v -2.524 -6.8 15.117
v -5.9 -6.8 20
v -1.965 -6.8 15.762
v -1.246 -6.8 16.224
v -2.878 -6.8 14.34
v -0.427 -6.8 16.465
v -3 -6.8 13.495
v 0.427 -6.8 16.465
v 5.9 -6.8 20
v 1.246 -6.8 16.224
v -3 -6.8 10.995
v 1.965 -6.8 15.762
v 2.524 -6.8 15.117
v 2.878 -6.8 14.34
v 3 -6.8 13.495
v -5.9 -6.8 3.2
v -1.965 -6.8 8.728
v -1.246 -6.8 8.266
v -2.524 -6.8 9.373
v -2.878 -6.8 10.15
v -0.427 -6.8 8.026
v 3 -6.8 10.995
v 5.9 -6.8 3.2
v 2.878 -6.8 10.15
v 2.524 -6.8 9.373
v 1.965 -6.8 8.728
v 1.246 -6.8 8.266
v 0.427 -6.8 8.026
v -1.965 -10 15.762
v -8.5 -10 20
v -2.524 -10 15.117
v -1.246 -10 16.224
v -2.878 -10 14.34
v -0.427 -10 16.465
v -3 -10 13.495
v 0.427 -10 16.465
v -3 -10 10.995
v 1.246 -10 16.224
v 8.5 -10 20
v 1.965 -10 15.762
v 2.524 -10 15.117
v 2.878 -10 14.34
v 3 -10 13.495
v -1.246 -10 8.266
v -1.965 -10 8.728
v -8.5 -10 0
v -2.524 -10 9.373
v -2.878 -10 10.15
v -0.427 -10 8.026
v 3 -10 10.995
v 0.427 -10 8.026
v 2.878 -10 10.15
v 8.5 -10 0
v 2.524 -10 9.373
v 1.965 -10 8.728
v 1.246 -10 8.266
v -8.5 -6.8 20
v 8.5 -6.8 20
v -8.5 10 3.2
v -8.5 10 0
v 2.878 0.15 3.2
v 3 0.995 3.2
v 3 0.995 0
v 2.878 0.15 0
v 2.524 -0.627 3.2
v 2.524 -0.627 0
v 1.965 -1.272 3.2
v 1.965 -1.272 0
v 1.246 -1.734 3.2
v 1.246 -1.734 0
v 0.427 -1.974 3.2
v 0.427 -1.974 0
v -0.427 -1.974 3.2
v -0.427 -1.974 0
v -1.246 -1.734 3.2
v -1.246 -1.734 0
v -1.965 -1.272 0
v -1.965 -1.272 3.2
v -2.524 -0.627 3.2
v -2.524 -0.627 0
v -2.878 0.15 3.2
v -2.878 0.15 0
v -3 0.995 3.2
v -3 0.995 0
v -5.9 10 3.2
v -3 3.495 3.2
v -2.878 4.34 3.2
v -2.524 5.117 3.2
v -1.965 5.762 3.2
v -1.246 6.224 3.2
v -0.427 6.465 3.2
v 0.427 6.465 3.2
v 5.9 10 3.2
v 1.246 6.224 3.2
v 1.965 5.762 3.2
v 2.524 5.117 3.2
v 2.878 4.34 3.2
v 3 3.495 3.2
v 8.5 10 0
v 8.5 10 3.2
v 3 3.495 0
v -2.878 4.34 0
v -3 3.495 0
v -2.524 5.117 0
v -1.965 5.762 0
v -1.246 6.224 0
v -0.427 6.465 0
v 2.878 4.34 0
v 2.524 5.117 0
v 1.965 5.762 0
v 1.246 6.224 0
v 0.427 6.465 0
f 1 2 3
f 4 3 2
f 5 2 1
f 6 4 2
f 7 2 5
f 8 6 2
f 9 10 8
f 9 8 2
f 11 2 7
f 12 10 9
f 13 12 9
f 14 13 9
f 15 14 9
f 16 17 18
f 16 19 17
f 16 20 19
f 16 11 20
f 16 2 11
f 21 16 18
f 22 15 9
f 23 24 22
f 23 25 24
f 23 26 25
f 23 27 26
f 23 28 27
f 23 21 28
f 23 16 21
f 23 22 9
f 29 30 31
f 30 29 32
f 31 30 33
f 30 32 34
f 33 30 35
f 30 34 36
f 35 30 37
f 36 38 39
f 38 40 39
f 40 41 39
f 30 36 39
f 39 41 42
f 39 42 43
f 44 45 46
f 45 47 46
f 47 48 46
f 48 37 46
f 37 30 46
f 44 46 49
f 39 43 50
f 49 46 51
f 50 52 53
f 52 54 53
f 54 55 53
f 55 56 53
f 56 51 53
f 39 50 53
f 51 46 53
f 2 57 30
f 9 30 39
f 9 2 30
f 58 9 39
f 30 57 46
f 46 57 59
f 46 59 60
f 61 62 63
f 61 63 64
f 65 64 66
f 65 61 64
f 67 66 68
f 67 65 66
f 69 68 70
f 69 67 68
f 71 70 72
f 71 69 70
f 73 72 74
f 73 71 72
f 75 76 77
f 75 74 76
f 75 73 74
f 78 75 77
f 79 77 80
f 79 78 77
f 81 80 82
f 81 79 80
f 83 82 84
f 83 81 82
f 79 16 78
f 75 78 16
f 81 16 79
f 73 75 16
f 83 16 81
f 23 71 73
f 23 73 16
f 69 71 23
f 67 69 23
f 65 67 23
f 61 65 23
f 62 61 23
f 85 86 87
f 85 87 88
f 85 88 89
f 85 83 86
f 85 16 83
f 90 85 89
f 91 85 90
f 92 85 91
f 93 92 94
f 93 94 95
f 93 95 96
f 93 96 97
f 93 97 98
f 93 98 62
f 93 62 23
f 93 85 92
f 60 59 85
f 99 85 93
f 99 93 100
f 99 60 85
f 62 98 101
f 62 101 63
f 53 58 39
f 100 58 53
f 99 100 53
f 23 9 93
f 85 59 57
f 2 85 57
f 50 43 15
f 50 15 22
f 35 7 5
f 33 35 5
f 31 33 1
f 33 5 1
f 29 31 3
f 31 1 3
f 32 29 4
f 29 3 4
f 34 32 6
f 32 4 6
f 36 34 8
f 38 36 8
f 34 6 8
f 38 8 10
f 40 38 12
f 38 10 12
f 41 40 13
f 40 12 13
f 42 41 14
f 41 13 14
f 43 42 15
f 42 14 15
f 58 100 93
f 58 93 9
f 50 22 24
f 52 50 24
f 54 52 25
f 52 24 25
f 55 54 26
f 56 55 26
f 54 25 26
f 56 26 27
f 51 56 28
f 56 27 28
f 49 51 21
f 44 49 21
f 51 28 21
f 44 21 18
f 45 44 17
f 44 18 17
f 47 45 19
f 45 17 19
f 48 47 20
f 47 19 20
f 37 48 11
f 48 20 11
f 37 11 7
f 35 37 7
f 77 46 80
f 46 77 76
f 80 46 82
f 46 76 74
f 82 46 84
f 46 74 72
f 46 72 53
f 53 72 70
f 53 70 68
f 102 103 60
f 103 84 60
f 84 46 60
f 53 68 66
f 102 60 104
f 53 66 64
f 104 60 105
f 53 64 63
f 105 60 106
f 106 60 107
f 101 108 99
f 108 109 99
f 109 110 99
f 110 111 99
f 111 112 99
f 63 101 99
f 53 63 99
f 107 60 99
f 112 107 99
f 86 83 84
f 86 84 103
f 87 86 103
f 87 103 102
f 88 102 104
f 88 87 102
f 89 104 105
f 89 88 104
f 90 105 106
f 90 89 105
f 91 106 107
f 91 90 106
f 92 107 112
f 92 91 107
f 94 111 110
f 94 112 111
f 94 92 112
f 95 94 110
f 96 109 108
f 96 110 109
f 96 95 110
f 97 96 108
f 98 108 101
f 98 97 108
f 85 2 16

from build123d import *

# Parameters (mm, degrees)
SKETCH_1_W          = 17
SKETCH_1_H          = 20
EXTRUDE_1_DEPTH     = 3.2
SKETCH_2_W          = 17
SKETCH_2_H          = 3.2
EXTRUDE_2_DEPTH     = 16.8
EXTRUDE_3_DEPTH     = 2.6
CUT_EXTRUDE_1_DEPTH = 22.318771072


with BuildPart() as part:
    # 草图1 → 凸台-拉伸1 (new body)
    with BuildSketch(Plane.XY):
        Rectangle(SKETCH_1_W, SKETCH_1_H)
    extrude(amount=EXTRUDE_1_DEPTH)

    # 草图2 → 凸台-拉伸2 (add)
    with BuildSketch(Plane.XY.offset(3.2)):
        with Locations((0, -8.4)):
            Rectangle(SKETCH_2_W, SKETCH_2_H)
    extrude(amount=EXTRUDE_2_DEPTH)

    # 草图3 → 凸台-拉伸3 (add)
    with BuildSketch(Plane.ZY.offset(8.5)):
        Polygon((3.2, 10), (20, -6.8), (3.2, -6.8), align=None)
    extrude_3 = extrude(amount=-EXTRUDE_3_DEPTH)

    # 镜向1: 凸台-拉伸3 across plane
    add(extrude_3.mirror(Plane(origin=(0, 0, 0), x_dir=(0, 0, 1), z_dir=(1, 0, 0))))

    # 草图4 → 切除-拉伸1 (cut, through all)
    with BuildSketch(Plane.XY.offset(3.2)):
        with BuildLine():
            Line((3, 3.495071076), (3, 0.995071076))
            ThreePointArc((3, 0.995071076), (0, -2.004928924), (-3, 0.995071076))
            Line((-3, 0.995071076), (-3, 3.495071076))
            ThreePointArc((-3, 3.495071076), (0, 6.495071076), (3, 3.495071076))
        make_face()
    cut_extrude_1 = extrude(amount=-CUT_EXTRUDE_1_DEPTH, mode=Mode.SUBTRACT)

    # 镜向2: 切除-拉伸1 across plane
    add(cut_extrude_1.mirror(Plane(origin=(0, -5, 5), x_dir=(0, 0.7071067811865479, 0.7071067811865472), z_dir=(0, -0.7071067811865474, 0.7071067811865478))), mode=Mode.SUBTRACT)


solid = part.part
